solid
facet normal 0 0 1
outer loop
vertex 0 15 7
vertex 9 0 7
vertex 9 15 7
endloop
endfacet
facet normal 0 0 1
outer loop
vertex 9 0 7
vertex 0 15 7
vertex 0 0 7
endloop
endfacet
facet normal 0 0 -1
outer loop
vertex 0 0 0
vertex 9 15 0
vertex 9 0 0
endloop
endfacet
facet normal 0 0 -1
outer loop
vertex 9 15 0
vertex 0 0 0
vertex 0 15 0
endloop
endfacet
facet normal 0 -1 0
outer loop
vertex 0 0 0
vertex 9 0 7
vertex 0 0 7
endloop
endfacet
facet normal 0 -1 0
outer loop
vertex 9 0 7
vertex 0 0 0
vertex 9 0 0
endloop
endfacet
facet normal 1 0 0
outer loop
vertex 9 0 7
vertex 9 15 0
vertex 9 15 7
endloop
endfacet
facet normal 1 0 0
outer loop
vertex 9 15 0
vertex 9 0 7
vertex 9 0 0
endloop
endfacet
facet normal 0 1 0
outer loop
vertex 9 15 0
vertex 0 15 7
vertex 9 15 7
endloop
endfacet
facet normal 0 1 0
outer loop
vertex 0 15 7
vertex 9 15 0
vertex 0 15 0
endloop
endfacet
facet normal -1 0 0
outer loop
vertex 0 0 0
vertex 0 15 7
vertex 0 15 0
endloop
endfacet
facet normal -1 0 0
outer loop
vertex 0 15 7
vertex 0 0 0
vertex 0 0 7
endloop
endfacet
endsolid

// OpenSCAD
// Generated by SolidPython 1.0.1 on 2020-07-29 00:46:55


cube(size = [9, 15, 7]);
/***********************************************
*********      SolidPython code:      **********
************************************************
 
# import packages: SolidPython
from solid import *
from solid.utils import *
from itertools import chain, combinations, permutations


class Resize:

    def __init__(self, scad_file):
        self.scad_file = scad_file
        #self.scad_file = import_scad(scad_file)
        # cone/cylinder param:
        self.r1 = 0
        self.r2 = 0
        self.h = 0
        # rectangular prism param:
        self.w = 0
        self.l = 0
        # ellipse param:
        self.r = 0

    # import OpenScad code (file name corresponds to shape)


    # classify shape + parameters
    def assign(self, param1, param2, param3):
        if self.scad_file == 'cone.scad':
            self.r1 = param1
            self.r2 = param2
            self.h = param3
        elif self.scad_file == 'cylinder.scad':
            self.r1 = param1
            self.r2 = param2
            self.h = param3
        elif self.scad_file == 'rectangularPrism.scad':
            self.h = param1
            self.l = param2
            self.w = param3
        else:
            self.r = param1
            self.h = param2

    # resize parameters
    def iterate(self):
        x = range(3, 20, 2)
        i = 1
        if self.scad_file == 'cone.scad':
            tempList = list(permutations(x, 2))
            for temp in tempList:
                param1 = temp[0]
                param2 = temp[1]
                filepath = 'produced_scad_files/' + 'cone' + str(param1) + '_' + str(param2) + '_' + '.scad'
                scad_render_to_file(cylinder(h=param1, r1=param2, r2=0), filepath)

        elif self.scad_file == 'cylinder.scad':
            tempList = list(permutations(x, 3))
            for temp in tempList:
                param1 = temp[0]
                param2 = temp[1]
                filepath = 'produced_scad_files/' + 'cylinder' + str(param1) + '_' + str(param2) + '_' + '.scad'
                scad_render_to_file(cylinder(h=param1, r1=param2, r2=param2), filepath)

        elif self.scad_file == 'rectangularPrism.scad':
            tempList = list(permutations(x, 3))
            for temp in tempList:
                param1 = temp[0]
                param2 = temp[1]
                param3 = temp[2]
                filepath = 'produced_scad_files/' + 'rectangularPrism' + str(param1) + '_' + str(param2) + '_' + str(
                    param3) + '.scad'
                scad_render_to_file(cube(size=(param1, param2, param3)), filepath)

        elif self.scad_file == 'ellipse.scad':
            tempList = list(permutations(x, 4))
            for temp in tempList:
                param1 = temp[0]
                param2 = temp[1]
                param3 = temp[2]
                param4 = temp[3]
                filepath = 'produced_scad_files/' + 'ellipse' + str(param1) + '_' + str(param2) + '_' + str(param3) + '_' + str(param4) + '.scad'
                scad_render_to_file(scale([param1, param2, param3])(sphere(r=param4)), filepath)

    def render_to_scadfile(self):
        scad_render_to_file(scad, 'example.scad') 
 
************************************************/
